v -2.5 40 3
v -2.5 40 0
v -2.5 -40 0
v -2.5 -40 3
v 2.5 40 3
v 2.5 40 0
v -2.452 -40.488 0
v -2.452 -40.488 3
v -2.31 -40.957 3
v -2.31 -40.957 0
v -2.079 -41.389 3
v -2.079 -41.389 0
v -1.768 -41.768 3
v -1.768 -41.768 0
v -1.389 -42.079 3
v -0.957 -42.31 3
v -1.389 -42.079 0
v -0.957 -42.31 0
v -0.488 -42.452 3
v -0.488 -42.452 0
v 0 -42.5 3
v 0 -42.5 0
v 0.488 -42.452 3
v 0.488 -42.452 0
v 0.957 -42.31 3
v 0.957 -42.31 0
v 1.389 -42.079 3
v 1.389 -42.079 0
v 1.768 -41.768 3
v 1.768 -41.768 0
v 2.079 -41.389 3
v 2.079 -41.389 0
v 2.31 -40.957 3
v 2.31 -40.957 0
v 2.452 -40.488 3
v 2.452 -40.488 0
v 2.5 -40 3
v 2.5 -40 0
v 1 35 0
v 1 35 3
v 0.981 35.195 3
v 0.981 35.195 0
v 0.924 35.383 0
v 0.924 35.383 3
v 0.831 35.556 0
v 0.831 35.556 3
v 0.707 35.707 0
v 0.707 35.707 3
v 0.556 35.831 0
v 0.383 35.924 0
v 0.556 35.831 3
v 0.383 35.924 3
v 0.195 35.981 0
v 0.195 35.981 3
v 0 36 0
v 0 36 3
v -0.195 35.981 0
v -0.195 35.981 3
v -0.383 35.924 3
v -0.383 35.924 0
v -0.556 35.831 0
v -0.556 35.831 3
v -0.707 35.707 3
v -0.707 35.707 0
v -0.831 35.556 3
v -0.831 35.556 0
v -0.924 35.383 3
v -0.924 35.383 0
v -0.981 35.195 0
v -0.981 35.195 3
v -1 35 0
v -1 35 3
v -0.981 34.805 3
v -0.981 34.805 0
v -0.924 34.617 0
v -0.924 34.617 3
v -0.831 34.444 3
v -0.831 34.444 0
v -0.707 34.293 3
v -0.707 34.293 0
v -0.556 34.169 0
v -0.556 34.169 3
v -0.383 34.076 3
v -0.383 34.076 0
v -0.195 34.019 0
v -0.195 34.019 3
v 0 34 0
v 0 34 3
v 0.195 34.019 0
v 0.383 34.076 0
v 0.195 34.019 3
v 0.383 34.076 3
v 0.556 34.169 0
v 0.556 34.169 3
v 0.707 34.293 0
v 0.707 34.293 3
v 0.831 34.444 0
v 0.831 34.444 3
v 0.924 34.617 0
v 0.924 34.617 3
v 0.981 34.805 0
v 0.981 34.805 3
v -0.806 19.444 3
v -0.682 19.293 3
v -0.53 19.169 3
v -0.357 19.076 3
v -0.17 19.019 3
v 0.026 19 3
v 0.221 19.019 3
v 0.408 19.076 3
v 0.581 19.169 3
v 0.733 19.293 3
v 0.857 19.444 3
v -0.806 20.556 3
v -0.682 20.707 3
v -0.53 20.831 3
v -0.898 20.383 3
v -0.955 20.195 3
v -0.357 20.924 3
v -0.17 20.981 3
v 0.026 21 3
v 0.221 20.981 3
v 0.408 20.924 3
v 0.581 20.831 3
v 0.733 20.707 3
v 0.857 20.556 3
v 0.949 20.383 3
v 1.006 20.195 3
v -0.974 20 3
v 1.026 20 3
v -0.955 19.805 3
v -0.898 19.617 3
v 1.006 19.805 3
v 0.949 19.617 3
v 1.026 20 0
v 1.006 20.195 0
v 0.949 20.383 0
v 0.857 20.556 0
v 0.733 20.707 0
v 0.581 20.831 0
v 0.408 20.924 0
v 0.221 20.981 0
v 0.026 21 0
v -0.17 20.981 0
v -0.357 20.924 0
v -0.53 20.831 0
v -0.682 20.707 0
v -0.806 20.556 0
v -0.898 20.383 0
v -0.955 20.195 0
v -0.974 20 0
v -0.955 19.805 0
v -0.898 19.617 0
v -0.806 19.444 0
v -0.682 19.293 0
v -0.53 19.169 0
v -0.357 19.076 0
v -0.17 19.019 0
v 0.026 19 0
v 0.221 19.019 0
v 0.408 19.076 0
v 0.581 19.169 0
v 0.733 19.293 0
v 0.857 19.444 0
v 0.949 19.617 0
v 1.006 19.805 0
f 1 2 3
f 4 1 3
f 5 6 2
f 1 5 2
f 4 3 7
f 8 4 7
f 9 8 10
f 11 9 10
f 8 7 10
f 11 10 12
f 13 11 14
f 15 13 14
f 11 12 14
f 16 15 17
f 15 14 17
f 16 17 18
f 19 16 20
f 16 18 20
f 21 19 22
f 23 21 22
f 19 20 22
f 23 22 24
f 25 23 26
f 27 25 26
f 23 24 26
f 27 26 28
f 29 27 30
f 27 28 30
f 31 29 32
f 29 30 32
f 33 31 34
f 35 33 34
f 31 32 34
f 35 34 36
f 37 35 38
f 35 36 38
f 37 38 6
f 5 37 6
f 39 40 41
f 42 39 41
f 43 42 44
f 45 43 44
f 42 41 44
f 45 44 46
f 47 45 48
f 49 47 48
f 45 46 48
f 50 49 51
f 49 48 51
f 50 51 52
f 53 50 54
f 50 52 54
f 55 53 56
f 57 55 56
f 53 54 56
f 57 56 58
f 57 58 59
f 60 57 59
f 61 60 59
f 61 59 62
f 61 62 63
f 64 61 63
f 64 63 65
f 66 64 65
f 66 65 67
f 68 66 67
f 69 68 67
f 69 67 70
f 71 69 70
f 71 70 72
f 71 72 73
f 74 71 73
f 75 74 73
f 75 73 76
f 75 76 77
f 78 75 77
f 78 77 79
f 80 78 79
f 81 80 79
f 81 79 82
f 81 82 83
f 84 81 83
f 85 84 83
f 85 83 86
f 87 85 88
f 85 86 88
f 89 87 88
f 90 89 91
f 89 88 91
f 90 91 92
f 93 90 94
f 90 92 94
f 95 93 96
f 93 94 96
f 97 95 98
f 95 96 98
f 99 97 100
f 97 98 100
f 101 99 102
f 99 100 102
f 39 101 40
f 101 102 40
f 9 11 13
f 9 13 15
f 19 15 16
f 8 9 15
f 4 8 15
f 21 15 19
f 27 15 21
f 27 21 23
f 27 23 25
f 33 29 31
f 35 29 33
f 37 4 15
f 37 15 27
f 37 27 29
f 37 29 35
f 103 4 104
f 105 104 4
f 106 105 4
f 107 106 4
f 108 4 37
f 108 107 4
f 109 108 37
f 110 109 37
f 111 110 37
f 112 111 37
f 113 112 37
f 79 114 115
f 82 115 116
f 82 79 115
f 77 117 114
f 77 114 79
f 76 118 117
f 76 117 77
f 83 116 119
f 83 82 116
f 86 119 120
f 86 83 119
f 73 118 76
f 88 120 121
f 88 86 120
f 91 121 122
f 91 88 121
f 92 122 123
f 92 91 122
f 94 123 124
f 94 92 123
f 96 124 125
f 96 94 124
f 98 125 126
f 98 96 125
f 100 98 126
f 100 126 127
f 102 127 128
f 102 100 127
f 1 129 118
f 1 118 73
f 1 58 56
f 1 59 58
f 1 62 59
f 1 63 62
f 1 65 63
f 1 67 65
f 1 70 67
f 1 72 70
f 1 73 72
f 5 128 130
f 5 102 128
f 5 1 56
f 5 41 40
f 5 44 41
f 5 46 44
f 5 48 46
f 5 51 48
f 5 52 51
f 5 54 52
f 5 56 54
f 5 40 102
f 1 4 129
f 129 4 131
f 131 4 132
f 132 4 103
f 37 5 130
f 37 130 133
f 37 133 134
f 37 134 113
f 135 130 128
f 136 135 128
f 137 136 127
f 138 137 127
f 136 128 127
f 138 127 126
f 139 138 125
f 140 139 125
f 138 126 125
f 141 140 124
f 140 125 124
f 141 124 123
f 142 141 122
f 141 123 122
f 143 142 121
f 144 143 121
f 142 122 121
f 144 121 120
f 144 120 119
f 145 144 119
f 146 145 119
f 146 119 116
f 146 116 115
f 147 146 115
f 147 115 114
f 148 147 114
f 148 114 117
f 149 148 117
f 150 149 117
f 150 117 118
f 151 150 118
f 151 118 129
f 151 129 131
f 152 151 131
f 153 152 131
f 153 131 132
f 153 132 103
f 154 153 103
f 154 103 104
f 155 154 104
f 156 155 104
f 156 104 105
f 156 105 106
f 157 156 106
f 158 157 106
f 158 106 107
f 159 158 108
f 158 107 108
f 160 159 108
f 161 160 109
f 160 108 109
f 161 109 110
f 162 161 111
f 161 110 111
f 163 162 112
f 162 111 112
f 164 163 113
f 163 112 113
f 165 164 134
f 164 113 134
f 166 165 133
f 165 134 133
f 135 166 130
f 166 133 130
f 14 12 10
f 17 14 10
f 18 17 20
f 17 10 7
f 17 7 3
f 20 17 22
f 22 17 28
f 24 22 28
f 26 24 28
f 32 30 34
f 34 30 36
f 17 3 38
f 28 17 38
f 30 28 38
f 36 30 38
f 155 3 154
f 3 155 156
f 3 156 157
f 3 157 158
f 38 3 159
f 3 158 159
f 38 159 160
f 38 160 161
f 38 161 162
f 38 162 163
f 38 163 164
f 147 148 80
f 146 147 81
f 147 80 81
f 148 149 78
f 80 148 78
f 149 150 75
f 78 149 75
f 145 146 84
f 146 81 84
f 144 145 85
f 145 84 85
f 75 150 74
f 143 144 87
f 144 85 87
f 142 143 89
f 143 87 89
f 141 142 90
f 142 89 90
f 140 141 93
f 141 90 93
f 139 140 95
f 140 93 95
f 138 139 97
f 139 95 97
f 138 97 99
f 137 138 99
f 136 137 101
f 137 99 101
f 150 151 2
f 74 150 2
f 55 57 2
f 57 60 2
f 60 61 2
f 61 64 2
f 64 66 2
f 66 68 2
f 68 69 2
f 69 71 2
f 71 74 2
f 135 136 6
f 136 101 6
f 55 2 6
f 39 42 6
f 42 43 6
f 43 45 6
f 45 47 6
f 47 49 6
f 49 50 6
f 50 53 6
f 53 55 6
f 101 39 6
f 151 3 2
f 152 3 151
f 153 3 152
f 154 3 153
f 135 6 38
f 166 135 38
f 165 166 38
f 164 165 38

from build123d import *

# Parameters (mm, degrees)
BOSS_EXTRUDE1_DEPTH = 3
SKETCH2_R           = 1
CUT_EXTRUDE1_DEPTH  = 43.679034666


with BuildPart() as part:
    # Sketch1 → Boss-Extrude1 (new body)
    with BuildSketch(Plane.XY):
        with BuildLine():
            Line((2.5, 40), (-2.5, 40))
            Line((-2.5, 40), (-2.5, -40))
            ThreePointArc((-2.5, -40), (0, -42.5), (2.5, -40))
            Line((2.5, -40), (2.5, 40))
        make_face()
    extrude(amount=BOSS_EXTRUDE1_DEPTH)

    # Sketch2 → Cut-Extrude1 (cut, through all)
    with BuildSketch(Plane.XY.offset(3)):
        with Locations((0, 35)):
            Circle(SKETCH2_R)
        with Locations((0.025500912, 20)):
            Circle(SKETCH2_R)
    extrude(amount=-CUT_EXTRUDE1_DEPTH, mode=Mode.SUBTRACT)


solid = part.part
